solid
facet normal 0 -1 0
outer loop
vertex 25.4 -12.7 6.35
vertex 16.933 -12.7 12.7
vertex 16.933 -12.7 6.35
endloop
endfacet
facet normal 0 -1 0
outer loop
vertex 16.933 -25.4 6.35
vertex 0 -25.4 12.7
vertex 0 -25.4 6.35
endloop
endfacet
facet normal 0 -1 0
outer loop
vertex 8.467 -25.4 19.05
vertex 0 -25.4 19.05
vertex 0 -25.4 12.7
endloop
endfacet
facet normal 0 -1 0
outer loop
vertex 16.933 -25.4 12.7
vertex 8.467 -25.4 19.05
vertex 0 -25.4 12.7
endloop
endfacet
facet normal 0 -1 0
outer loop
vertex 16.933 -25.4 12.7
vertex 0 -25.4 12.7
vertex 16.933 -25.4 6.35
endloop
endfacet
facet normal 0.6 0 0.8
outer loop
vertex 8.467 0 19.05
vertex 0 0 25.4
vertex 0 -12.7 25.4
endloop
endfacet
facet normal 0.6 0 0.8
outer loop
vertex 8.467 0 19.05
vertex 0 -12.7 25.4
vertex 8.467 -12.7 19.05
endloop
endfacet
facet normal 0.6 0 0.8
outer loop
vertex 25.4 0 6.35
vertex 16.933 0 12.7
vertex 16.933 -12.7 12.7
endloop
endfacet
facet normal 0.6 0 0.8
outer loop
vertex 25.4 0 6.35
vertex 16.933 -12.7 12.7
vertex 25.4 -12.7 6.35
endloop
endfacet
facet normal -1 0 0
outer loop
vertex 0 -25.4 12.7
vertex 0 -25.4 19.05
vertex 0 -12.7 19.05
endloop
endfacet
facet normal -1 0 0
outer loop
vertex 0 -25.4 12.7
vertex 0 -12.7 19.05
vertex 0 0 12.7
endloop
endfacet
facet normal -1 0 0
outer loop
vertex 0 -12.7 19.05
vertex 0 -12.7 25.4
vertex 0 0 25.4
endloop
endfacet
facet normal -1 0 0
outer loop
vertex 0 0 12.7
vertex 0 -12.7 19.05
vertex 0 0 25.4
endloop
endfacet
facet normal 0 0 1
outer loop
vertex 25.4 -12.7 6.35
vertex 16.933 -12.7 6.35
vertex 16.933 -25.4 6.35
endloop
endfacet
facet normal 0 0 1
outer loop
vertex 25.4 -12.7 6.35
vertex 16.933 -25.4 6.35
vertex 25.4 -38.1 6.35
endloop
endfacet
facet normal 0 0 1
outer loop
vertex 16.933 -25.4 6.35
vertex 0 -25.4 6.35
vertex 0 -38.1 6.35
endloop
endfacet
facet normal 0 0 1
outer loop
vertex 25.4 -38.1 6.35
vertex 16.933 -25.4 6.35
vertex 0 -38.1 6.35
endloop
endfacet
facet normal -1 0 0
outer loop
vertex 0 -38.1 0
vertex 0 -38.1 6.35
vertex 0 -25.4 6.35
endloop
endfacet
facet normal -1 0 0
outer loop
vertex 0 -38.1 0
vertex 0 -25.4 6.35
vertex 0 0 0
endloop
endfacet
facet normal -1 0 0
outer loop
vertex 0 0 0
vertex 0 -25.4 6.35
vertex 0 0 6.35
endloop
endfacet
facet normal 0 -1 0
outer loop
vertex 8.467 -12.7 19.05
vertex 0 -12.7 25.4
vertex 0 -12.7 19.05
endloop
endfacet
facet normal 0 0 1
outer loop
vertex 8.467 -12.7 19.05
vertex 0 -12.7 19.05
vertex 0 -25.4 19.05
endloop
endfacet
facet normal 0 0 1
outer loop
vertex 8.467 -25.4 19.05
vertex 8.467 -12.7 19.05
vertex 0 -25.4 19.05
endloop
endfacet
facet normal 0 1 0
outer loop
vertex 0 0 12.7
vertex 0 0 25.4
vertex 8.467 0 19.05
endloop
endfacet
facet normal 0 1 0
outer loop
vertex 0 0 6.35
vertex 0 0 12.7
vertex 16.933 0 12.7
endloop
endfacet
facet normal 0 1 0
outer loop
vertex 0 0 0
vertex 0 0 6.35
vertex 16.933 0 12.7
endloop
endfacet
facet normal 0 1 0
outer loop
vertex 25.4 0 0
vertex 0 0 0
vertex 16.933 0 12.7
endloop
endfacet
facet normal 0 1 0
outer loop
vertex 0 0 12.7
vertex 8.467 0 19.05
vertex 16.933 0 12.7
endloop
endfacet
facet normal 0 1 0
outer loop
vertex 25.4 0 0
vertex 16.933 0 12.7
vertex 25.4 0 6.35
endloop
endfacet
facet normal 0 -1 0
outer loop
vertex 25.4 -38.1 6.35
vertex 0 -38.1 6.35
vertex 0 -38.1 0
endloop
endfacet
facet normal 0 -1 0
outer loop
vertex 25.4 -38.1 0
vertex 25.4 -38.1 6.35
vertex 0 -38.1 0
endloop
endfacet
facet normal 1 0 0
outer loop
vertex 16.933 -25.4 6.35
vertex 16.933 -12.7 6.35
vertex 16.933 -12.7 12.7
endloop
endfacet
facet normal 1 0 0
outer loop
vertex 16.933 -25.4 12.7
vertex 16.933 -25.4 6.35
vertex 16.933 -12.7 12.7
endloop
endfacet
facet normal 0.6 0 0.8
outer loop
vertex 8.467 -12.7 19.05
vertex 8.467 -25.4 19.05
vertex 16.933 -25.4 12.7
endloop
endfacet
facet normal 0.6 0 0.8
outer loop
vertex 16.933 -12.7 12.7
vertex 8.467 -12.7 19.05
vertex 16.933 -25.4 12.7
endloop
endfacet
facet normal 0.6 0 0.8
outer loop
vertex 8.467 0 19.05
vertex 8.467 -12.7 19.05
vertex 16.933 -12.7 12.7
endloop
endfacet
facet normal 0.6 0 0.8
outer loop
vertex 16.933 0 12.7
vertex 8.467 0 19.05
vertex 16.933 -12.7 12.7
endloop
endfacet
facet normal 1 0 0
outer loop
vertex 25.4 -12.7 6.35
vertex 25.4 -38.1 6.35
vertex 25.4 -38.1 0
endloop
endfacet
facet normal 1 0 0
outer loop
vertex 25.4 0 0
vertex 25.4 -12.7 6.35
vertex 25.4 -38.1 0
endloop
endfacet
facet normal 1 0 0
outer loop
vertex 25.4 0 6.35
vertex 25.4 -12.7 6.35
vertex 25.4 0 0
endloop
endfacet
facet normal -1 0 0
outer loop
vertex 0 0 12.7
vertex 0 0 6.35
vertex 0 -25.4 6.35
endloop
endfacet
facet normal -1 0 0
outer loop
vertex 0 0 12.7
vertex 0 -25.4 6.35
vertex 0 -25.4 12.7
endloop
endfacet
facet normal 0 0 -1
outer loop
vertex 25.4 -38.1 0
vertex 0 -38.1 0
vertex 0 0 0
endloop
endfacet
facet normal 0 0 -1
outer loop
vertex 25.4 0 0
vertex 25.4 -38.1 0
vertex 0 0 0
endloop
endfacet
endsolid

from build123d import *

# Parameters (mm, degrees)
F2_DEPTH = 25.4
F3_DEPTH = 25.4
F4_DEPTH = 38.101
F0_W     = 16.933333
F0_H     = 6.35
F5_DEPTH = 25.4


with BuildPart() as f2:
    # F1 (on Right) → F2 (new body)
    with BuildSketch(Plane.YZ):
        Polygon((-38.1, 0), (0, 0), (0, 6.35), (-12.7, 6.35), (-25.4, 6.35), (-38.1, 6.35), align=None)
    extrude(amount=F2_DEPTH)

    # F1 (on Right) → F3 (join)
    with BuildSketch(Plane.YZ):
        Polygon((-12.7, 6.35), (0, 6.35), (0, 25.4), (-12.7, 25.4), (-12.7, 19.05), (-25.4, 19.05), (-25.4, 12.7), (-12.7, 12.7), align=None)
    extrude(amount=F3_DEPTH)

    # F0 (on Front) → F4 (cut, through all)
    with BuildSketch(Plane.XZ):
        Polygon((16.933333, 12.7), (25.4, 6.35), (25.4, 25.4), (0, 25.4), (8.466667, 19.05), align=None)
    extrude(amount=F4_DEPTH, mode=Mode.SUBTRACT)

    # F0 (on Front) → F5 (join)
    with BuildSketch(Plane.XZ):
        with Locations((8.466666, 9.525)):
            Rectangle(F0_W, F0_H)
    extrude(amount=F5_DEPTH)


solid = f2.part
